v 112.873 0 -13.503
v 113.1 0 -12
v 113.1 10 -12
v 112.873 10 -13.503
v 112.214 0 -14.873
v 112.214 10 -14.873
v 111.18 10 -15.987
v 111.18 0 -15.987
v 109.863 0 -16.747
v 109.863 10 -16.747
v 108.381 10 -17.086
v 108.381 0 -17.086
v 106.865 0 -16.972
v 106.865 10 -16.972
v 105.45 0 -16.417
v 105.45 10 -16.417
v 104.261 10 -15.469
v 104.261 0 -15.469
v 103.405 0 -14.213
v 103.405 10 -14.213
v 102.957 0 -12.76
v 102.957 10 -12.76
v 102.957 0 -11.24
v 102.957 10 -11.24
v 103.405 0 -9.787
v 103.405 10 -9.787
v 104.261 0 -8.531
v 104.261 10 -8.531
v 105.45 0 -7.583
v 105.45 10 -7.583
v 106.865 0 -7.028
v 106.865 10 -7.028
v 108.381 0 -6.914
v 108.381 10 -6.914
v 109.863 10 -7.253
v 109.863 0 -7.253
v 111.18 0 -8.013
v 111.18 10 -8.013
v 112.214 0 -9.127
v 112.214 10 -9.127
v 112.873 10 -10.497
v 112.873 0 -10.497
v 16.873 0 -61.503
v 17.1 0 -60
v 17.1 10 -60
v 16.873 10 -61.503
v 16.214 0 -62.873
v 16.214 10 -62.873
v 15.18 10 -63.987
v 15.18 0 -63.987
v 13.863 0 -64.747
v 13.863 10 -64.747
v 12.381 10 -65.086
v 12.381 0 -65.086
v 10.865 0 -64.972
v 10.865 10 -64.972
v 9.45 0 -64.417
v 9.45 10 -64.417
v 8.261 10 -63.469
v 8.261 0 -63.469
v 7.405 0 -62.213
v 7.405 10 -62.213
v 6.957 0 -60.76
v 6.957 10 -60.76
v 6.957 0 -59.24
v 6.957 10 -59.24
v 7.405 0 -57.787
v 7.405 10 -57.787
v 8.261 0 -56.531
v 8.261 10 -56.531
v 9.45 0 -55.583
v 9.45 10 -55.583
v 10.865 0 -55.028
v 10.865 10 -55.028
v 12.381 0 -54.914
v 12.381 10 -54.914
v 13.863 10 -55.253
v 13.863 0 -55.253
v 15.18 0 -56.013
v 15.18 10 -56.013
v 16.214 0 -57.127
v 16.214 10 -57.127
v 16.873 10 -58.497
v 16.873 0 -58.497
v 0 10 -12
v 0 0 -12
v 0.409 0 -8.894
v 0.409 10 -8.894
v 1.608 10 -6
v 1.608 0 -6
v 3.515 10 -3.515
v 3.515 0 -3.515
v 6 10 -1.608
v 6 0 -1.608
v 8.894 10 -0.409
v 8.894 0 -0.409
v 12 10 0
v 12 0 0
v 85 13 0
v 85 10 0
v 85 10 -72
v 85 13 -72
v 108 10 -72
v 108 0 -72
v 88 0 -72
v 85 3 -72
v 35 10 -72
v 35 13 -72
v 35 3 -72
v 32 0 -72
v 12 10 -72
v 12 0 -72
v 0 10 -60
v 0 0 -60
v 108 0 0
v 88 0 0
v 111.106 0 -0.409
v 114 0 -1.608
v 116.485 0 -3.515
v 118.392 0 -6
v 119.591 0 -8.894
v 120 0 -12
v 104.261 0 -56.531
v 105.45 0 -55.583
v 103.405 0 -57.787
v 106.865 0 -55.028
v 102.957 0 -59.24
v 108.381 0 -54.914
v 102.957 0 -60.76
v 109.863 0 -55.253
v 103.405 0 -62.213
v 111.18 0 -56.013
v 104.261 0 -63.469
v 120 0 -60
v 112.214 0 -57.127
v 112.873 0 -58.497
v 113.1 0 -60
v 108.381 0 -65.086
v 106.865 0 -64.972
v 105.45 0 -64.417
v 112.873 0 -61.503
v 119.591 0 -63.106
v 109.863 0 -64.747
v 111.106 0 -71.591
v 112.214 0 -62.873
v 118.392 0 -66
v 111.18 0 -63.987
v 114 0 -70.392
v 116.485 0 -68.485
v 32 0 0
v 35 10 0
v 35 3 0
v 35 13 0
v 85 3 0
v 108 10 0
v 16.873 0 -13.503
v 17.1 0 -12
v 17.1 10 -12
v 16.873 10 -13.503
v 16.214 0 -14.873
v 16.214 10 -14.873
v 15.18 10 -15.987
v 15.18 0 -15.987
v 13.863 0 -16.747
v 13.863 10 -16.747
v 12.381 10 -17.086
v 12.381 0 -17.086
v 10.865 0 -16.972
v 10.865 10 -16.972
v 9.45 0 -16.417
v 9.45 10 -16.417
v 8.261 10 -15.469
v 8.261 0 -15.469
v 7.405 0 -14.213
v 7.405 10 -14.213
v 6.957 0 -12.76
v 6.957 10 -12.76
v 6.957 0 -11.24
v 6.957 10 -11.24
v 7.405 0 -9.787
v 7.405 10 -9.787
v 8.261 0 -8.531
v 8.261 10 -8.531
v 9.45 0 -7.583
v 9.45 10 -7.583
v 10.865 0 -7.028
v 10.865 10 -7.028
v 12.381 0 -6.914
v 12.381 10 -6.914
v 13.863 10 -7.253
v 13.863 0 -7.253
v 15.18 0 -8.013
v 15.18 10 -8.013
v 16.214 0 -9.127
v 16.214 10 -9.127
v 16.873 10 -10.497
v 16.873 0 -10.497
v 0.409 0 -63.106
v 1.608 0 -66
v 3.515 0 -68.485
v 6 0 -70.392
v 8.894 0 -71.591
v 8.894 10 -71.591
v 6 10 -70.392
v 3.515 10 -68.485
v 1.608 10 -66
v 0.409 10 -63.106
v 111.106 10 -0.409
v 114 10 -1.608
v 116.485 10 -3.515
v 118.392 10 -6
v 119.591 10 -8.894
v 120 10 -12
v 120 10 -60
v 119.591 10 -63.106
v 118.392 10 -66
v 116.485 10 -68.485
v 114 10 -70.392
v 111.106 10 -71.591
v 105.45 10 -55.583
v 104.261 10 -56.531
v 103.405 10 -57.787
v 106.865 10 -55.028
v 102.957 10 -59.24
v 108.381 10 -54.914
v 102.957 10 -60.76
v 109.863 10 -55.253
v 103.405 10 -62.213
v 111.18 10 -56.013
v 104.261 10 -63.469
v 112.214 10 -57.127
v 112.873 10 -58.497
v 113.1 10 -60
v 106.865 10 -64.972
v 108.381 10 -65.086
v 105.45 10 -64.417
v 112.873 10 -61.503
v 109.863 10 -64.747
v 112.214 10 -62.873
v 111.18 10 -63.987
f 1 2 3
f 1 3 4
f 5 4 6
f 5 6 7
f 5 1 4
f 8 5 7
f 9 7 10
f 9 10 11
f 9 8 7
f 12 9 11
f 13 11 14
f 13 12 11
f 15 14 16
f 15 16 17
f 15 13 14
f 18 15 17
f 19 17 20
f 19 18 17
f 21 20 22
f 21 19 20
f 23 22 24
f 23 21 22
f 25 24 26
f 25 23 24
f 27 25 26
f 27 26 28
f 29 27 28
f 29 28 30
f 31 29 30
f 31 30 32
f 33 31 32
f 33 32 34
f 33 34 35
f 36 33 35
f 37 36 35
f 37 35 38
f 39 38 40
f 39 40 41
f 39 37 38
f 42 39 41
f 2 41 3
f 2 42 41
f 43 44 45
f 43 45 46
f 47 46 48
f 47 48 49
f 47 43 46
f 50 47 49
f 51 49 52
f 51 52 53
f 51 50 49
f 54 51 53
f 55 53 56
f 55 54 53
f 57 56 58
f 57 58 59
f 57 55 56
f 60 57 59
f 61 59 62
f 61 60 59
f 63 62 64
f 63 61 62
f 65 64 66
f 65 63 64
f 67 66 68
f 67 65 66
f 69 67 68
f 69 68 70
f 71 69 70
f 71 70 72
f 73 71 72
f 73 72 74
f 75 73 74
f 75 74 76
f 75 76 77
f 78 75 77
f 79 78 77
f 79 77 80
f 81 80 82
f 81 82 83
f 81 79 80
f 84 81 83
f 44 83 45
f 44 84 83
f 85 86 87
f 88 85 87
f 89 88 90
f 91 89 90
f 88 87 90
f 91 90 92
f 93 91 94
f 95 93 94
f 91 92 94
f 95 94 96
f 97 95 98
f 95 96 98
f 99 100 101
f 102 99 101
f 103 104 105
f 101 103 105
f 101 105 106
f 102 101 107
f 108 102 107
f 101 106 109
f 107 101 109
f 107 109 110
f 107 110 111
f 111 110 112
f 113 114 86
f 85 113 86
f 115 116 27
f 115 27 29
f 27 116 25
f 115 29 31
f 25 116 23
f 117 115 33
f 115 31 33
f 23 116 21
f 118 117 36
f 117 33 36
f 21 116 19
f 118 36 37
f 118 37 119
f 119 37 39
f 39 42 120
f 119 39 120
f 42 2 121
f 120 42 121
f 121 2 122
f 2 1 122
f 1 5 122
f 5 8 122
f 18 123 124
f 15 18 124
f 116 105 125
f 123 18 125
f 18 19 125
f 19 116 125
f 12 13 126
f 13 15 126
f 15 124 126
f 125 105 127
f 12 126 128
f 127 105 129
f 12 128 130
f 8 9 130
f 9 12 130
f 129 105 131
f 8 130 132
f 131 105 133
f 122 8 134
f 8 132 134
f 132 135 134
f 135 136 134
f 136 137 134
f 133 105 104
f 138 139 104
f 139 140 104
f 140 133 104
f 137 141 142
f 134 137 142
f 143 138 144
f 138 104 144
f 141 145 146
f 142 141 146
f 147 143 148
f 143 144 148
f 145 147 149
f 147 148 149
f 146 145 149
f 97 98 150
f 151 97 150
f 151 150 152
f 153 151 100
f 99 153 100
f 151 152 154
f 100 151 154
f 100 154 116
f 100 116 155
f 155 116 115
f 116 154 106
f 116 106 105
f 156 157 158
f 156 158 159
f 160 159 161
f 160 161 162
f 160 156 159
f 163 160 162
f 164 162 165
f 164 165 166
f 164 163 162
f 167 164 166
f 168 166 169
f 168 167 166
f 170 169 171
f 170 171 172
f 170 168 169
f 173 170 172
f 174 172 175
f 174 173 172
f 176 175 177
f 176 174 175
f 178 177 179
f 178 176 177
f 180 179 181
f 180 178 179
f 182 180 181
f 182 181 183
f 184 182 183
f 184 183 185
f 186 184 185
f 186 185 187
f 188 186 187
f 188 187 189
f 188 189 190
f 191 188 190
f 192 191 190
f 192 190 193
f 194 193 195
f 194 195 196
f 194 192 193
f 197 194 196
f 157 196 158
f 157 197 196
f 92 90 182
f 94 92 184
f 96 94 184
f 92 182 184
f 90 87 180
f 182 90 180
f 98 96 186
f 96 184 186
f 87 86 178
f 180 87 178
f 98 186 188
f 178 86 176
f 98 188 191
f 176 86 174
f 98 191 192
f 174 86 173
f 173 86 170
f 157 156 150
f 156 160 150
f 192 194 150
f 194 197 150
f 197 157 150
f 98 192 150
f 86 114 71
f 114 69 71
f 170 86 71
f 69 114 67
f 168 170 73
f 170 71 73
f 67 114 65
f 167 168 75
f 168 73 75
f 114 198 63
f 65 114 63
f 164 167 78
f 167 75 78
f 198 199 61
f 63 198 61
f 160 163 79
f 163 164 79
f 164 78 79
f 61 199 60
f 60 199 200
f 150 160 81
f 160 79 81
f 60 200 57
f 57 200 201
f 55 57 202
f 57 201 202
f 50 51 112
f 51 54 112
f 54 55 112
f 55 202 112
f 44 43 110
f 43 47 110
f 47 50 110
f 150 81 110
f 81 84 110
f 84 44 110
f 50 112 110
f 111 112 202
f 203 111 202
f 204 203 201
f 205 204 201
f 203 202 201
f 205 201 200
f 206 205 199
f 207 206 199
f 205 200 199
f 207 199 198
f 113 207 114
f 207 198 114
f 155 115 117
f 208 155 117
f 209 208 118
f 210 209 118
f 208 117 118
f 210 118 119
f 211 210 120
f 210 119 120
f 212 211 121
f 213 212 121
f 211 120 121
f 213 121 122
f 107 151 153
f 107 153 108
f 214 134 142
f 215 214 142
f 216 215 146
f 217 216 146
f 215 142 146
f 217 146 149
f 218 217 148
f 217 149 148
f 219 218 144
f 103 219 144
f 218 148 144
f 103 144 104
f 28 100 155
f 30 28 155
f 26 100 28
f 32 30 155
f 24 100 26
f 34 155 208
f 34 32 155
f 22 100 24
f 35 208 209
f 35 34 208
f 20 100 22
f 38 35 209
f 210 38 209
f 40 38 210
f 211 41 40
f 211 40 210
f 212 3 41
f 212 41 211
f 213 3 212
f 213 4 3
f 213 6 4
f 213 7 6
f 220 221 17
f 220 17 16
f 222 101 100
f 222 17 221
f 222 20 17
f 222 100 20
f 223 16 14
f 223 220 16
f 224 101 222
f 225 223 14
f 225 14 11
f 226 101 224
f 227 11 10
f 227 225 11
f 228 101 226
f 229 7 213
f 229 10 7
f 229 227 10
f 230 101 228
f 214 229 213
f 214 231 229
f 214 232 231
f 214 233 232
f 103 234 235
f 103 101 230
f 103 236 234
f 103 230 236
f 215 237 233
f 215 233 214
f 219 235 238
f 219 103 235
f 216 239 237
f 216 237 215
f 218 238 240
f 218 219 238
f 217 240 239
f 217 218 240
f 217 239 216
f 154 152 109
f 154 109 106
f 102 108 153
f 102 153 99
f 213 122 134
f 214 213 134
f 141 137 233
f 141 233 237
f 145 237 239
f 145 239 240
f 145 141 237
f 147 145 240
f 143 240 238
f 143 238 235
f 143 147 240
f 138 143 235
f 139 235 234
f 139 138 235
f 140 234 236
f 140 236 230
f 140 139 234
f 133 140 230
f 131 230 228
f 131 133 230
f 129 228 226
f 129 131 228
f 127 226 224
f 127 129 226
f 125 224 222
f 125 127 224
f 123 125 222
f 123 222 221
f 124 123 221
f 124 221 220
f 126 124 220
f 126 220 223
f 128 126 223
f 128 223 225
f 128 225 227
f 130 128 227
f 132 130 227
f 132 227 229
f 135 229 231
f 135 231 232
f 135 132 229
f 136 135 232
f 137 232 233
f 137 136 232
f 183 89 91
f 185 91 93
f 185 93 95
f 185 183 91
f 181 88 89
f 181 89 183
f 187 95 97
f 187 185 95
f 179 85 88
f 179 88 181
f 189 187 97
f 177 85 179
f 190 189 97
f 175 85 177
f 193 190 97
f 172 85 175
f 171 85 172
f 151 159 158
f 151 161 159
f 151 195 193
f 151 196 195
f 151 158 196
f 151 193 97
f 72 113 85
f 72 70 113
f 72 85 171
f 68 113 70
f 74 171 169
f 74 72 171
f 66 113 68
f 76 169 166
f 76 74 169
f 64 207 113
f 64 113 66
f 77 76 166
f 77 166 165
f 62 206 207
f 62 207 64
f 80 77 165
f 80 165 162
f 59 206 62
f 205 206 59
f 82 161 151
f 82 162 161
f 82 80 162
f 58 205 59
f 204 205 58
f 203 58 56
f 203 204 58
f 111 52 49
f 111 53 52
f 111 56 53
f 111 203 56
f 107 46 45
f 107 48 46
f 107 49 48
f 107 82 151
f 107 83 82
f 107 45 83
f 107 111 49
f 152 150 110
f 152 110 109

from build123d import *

# Parameters (mm, degrees)
SKETCH1_R           = 5.1
SKETCH1_W           = 50
SKETCH1_H           = 72
BOSS_EXTRUDE7_DEPTH = 10
CUT_EXTRUDE2_DEPTH  = 72
SKETCH7_W           = 50
SKETCH7_H           = 72
BOSS_EXTRUDE8_DEPTH = 3


with BuildPart() as part:
    # Sketch1 → Boss-Extrude7 (new body)
    with BuildSketch(Plane(origin=(0, 0, 0), x_dir=(1, 0, 0), z_dir=(0, 1, 0))):
        with BuildLine():
            ThreePointArc((0, 12), (3.514718626, 3.514718626), (12, 0))
            Line((12, 0), (35, 0))
            Line((35, 0), (35, 72))
            Line((35, 72), (12, 72))
            ThreePointArc((12, 72), (3.514718626, 68.485281374), (0, 60))
            Line((0, 60), (0, 12))
        make_face()
        with Locations((12, 12)):
            Circle(SKETCH1_R, mode=Mode.SUBTRACT)
        with Locations((12, 60)):
            Circle(SKETCH1_R, mode=Mode.SUBTRACT)
        with Locations((60, 36)):
            Rectangle(SKETCH1_W, SKETCH1_H)
        with BuildLine():
            Line((85, 72), (85, 0))
            Line((85, 0), (108, 0))
            ThreePointArc((108, 0), (116.485281374, 3.514718626), (120, 12))
            Line((120, 12), (120, 60))
            ThreePointArc((120, 60), (116.485281374, 68.485281374), (108, 72))
            Line((108, 72), (85, 72))
        make_face()
        with Locations((108, 12)):
            Circle(SKETCH1_R, mode=Mode.SUBTRACT)
        with Locations((108, 60)):
            Circle(SKETCH1_R, mode=Mode.SUBTRACT)
    extrude(amount=BOSS_EXTRUDE7_DEPTH)

    # Sketch5 → Cut-Extrude2 (cut)
    with BuildSketch(Plane.XY):
        Polygon((32, 0), (35, 3), (85, 3), (88, 0), align=None)
    extrude(amount=-CUT_EXTRUDE2_DEPTH, mode=Mode.SUBTRACT)

    # Sketch7 → Boss-Extrude8 (add)
    with BuildSketch(Plane(origin=(0, 10, 0), x_dir=(1, 0, 0), z_dir=(0, 1, 0))):
        with Locations((60, 36)):
            Rectangle(SKETCH7_W, SKETCH7_H)
    extrude(amount=BOSS_EXTRUDE8_DEPTH)


solid = part.part
